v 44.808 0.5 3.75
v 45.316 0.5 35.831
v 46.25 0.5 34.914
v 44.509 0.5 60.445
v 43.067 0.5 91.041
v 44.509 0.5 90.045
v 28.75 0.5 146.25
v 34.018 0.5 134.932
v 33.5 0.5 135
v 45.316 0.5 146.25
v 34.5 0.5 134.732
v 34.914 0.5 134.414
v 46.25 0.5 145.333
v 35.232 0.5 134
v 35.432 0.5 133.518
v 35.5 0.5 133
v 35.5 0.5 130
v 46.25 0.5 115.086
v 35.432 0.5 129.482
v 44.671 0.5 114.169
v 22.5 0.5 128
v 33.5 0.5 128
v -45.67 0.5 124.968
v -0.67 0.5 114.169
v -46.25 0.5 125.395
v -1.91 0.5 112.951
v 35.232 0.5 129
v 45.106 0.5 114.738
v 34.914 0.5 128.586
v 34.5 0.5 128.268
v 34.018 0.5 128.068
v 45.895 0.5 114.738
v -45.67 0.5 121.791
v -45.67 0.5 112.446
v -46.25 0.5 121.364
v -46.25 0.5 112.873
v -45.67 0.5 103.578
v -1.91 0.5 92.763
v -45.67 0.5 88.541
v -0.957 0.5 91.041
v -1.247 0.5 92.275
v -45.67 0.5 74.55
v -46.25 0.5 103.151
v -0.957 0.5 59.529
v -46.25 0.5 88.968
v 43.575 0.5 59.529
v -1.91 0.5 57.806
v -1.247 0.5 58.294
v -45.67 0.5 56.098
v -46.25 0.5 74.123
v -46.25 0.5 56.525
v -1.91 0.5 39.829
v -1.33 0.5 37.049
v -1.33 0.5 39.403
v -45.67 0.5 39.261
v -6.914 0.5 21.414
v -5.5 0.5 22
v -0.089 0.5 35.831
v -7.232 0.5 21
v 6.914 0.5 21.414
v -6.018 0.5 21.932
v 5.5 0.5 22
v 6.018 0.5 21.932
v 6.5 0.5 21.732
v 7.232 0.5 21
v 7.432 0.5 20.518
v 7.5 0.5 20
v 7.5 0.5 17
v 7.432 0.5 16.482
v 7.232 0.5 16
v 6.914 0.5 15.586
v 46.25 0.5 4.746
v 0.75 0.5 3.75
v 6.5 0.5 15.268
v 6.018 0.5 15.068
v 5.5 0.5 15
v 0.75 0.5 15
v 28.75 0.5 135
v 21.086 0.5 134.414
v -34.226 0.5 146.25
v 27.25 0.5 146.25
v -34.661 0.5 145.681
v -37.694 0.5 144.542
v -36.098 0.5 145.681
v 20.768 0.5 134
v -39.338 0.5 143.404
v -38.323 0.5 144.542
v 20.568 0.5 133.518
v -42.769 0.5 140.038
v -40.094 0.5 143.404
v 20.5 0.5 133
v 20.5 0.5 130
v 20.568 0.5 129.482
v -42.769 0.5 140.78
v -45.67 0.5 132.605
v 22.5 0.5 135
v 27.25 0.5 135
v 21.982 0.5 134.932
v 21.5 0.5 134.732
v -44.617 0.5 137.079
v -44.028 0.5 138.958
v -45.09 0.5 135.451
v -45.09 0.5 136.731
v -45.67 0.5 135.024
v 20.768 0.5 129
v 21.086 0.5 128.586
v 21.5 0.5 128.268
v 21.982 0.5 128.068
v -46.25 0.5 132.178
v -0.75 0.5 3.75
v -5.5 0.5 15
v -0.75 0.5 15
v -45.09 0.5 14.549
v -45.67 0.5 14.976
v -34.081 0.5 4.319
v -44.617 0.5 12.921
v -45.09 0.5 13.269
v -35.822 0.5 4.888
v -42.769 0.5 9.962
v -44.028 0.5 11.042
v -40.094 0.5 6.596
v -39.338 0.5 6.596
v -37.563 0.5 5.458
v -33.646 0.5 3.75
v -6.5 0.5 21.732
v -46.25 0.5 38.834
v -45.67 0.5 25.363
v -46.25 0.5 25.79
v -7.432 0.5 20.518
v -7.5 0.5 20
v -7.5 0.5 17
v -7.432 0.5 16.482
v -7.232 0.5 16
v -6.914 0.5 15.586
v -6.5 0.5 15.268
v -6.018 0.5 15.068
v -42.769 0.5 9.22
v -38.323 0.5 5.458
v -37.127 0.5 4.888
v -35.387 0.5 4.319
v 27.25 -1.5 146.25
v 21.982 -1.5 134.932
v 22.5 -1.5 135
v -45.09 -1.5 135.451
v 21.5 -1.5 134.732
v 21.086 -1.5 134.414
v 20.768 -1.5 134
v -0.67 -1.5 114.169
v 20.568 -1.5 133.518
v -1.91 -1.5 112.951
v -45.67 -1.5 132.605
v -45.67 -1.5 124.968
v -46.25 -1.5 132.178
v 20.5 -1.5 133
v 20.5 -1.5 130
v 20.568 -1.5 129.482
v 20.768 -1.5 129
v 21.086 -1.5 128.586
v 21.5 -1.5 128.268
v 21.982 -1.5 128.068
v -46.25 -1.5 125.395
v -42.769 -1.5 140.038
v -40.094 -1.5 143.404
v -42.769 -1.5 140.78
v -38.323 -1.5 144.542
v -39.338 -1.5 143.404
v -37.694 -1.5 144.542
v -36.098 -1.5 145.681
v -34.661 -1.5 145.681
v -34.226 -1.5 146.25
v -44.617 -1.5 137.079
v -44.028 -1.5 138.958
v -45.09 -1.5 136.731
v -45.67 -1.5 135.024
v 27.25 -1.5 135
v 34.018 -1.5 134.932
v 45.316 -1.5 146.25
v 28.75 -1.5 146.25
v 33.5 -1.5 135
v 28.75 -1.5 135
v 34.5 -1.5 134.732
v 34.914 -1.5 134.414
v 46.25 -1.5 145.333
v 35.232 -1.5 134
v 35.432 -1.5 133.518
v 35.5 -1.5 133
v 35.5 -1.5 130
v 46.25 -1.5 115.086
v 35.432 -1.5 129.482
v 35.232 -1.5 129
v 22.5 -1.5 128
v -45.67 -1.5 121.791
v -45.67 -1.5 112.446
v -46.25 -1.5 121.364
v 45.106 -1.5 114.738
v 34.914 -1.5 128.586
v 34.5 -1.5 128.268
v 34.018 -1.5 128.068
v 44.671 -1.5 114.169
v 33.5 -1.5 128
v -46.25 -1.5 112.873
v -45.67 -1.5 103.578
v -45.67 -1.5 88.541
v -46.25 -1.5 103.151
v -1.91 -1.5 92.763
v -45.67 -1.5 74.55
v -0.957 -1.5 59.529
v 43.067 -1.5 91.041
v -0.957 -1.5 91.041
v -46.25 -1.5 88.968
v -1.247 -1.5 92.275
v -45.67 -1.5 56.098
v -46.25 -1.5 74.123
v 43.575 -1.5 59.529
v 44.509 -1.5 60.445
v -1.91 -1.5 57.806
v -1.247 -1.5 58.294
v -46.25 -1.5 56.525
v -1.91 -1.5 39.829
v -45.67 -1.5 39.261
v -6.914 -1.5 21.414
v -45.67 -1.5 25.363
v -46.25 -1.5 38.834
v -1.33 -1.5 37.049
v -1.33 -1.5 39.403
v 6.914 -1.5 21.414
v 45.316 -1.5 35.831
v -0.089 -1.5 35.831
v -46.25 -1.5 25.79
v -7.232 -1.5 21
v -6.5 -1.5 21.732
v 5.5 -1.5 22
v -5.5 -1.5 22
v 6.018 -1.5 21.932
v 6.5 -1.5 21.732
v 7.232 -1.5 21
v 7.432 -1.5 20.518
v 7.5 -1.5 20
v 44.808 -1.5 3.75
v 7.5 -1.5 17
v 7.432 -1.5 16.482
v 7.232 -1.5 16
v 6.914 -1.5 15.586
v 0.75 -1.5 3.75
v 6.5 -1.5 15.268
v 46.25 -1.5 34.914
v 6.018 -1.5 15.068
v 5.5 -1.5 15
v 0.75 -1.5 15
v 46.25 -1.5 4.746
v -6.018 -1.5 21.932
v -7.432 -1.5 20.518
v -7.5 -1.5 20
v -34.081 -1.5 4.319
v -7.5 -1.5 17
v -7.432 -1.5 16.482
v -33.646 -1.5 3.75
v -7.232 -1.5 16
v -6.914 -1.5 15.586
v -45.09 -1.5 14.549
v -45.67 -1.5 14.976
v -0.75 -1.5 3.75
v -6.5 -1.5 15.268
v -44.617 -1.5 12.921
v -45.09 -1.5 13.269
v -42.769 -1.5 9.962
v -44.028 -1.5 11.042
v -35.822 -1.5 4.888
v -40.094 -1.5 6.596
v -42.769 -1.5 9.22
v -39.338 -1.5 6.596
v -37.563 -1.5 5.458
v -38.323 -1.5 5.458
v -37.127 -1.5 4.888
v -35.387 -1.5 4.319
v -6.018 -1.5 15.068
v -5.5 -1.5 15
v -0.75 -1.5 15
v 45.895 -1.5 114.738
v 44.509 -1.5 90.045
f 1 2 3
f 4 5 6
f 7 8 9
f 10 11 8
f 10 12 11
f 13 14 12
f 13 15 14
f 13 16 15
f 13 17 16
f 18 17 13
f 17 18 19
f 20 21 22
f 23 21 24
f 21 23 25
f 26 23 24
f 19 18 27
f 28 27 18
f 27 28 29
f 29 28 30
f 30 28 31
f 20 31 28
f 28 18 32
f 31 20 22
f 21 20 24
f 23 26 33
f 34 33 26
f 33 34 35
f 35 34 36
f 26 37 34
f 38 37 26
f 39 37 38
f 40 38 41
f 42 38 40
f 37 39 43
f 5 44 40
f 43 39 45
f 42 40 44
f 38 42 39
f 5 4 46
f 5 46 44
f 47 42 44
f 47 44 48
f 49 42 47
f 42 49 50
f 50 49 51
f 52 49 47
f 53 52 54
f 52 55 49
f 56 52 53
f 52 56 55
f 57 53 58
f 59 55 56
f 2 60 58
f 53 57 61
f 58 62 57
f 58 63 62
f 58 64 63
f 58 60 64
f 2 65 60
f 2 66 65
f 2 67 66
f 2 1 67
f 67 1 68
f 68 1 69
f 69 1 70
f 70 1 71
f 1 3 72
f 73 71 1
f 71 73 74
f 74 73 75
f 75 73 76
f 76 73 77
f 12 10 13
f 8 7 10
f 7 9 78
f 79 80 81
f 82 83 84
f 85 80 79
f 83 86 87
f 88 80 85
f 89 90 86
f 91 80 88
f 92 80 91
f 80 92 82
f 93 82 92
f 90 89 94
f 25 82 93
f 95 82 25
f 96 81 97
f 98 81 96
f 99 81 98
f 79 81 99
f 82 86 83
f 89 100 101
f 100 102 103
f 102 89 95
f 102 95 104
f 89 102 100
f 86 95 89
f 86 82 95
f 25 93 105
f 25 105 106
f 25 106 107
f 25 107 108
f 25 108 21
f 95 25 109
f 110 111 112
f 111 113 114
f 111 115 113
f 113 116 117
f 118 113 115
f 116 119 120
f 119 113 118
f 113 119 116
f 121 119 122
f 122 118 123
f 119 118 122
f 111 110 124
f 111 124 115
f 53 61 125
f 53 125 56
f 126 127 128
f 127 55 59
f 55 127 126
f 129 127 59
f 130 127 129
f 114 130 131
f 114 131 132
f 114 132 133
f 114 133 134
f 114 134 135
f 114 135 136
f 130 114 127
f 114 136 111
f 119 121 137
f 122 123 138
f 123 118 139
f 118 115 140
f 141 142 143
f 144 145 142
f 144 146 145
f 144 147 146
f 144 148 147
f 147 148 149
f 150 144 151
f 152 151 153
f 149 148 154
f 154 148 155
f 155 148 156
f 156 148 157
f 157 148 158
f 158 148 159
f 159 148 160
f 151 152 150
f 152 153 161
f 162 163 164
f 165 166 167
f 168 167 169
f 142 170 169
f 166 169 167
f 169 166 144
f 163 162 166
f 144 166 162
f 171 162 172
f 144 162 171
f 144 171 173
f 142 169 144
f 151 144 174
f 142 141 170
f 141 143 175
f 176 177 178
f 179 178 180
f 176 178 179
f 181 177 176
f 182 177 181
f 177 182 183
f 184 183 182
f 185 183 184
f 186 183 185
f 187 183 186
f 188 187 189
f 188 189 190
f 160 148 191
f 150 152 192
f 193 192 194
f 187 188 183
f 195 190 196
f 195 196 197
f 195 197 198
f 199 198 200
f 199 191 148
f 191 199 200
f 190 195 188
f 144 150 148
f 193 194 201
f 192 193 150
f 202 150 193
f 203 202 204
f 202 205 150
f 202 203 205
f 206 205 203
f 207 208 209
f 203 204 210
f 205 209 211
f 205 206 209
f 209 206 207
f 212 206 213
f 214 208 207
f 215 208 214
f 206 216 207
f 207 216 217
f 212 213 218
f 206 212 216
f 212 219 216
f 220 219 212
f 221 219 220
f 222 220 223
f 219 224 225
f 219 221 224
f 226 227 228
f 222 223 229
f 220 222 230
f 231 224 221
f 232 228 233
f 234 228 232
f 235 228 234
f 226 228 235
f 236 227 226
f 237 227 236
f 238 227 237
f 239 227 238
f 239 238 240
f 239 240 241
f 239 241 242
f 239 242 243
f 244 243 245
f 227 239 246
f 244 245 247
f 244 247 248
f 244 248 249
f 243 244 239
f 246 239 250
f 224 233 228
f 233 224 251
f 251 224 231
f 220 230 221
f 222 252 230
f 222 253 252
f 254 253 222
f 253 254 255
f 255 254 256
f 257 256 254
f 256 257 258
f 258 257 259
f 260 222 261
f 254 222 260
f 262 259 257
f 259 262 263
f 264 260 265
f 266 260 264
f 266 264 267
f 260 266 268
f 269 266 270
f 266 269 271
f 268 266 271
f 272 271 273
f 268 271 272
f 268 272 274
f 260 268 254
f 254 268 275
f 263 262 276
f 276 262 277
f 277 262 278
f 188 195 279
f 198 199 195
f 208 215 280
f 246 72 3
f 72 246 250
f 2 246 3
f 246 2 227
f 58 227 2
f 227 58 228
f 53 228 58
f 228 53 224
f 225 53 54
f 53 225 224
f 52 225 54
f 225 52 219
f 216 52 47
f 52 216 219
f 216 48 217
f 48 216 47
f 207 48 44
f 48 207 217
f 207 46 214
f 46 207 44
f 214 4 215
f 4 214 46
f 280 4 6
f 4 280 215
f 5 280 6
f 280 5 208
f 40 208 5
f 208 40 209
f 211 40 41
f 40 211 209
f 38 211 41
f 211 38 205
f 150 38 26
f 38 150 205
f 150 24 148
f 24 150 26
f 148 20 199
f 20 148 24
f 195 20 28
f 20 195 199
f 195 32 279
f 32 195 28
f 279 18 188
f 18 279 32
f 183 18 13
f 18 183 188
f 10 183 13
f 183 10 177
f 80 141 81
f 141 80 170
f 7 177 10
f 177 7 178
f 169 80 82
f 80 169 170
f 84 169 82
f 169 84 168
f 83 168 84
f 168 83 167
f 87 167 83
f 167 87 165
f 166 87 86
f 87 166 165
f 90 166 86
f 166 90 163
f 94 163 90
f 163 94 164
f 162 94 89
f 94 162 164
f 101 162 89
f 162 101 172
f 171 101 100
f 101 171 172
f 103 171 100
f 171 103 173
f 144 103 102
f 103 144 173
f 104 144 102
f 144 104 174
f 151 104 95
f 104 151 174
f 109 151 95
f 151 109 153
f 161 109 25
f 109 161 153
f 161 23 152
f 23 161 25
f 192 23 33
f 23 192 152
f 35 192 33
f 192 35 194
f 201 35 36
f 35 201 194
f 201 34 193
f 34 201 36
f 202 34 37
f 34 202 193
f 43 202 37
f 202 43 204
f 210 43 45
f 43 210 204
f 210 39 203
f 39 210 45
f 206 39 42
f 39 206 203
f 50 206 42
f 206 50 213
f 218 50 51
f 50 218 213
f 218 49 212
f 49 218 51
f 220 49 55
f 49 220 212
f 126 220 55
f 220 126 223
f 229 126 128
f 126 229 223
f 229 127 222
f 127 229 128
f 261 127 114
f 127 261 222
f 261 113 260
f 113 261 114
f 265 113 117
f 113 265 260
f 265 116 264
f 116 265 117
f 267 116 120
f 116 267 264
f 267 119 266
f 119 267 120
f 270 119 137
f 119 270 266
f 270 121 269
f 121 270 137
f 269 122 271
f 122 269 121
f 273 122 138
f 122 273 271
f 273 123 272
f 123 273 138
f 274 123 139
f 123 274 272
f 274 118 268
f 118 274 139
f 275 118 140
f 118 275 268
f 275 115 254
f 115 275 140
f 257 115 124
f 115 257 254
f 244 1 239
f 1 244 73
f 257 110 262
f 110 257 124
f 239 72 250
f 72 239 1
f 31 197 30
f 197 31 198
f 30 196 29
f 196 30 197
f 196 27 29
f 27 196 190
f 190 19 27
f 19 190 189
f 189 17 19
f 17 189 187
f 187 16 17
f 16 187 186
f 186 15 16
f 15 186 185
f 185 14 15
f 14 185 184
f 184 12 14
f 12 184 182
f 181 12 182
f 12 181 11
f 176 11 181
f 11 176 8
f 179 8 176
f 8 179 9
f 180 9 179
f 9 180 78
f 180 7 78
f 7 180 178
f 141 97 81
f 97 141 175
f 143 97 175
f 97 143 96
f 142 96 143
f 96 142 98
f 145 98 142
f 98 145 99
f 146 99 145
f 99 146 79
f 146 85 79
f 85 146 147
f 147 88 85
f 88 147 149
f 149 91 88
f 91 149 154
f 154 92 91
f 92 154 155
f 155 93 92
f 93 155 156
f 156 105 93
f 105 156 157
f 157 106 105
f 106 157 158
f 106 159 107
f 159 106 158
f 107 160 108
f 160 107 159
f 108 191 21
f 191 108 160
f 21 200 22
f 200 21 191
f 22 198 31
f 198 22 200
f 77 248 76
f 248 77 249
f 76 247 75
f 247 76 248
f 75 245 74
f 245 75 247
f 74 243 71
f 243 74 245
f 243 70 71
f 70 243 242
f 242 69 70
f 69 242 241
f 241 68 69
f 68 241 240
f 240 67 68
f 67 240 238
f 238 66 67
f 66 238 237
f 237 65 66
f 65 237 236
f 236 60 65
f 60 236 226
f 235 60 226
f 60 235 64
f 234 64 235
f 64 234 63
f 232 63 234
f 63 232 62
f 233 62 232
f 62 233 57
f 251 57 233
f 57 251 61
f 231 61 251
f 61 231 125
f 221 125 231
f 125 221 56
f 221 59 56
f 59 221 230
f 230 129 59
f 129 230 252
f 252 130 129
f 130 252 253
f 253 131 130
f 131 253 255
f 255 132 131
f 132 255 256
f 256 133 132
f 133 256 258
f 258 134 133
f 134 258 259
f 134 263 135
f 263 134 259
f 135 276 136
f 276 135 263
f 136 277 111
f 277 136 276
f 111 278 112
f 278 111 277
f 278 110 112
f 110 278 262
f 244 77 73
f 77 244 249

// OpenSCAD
// file: shape_pts.scad
// Letter "E" (#6 Lower) ? Top X=+28 Conduit (under n right leg) + Bottom X=0 Conduit
// Vertical-display edition: bottom divider clip removed, interlocking hollow double-dovetail channels added.

shape_w = 94.00;
shape_h = 144.00;

rec_snap_top_x = 6.00;
rec_snap_top_z = 144.00;
rec_snap_bot_x = 0.00;

rec_top_conn_enable   = true;
rec_top_conn_x        = 28.00;
rec_bot_conn_enable   = true;
rec_bot_conn_x        = 0.00;
rec_left_conn_enable  = false;
rec_left_conn_z       = 0.00;
rec_left_conn_face_x  = 0.00;
rec_left_conn_pocket_x = 0.00;
rec_right_conn_enable = false;
rec_right_conn_z      = 0.00;
rec_right_conn_face_x = 0.00;
rec_right_conn_pocket_x = 0.00;

rec_magnet_enable = true;
rec_magnet_x      = -24.00;
rec_magnet_z      = 96.20;

rec_wall_mount_enable = true;
rec_wall_mount_x      = 0.00;
rec_wall_mount_z      = 72.30;

rec_include_controller = false;
rec_chip_x     = -24.50;
rec_chip_z     = 82.00;
rec_cable_x    = -24.50;
rec_ziptie_z   = 33.50;
rec_keyhole_z  = 19.50;
rec_slit_dir   = -1;

rec_pillars = [[28.0, 18.0], [25.0, 72.3], [-24.5, 128.0], [-24.5, 38.0]];
rec_has_face_grooves = false;

shape_pts = [
    [0.218,33.581], [-0.58,34.364], [-0.58,36.783], [-1.16,37.209], [-1.16,54.427], [-0.58,54.854],
    [-0.363,55.779], [43.881,55.779], [45.259,57.13], [45.259,87.439], [43.301,88.791], [-0.363,88.791],
    [-0.58,89.715], [-1.16,90.142], [-1.16,109.636], [-0.363,110.419], [45.042,110.419], [45.477,110.988],
    [46.202,110.988], [47.0,111.771], [47.0,142.648], [45.622,144.0], [-34.597,144.0], [-35.032,143.431],
    [-36.338,143.431], [-37.934,142.292], [-38.659,142.292], [-39.674,141.154], [-40.4,141.154], [-43.519,138.095],
    [-43.519,137.383], [-44.679,136.387], [-45.259,134.538], [-45.84,134.111], [-45.84,132.83], [-46.42,132.403],
    [-46.42,129.984], [-47.0,129.557], [-47.0,122.016], [-46.42,121.589], [-46.42,119.17], [-47.0,118.743],
    [-47.0,109.494], [-46.42,109.067], [-46.42,100.957], [-47.0,100.53], [-47.0,85.589], [-46.42,85.162],
    [-46.42,71.929], [-47.0,71.502], [-47.0,53.146], [-46.42,52.719], [-46.42,36.64], [-47.0,36.213],
    [-47.0,22.411], [-46.42,21.984], [-46.42,11.597], [-45.84,11.17], [-45.84,9.889], [-45.259,9.462],
    [-44.679,7.613], [-43.519,6.617], [-43.519,5.905], [-40.4,2.846], [-39.674,2.846], [-38.659,1.708],
    [-37.934,1.708], [-37.498,1.138], [-36.193,1.138], [-35.758,0.569], [-34.452,0.569], [-34.017,0.0],
    [45.042,0.0], [47.0,1.352], [47.0,32.229], [45.622,33.581]
];
shape_paths = [[0, 1, 2, 3, 4, 5, 6, 7, 8, 9, 10, 11, 12, 13, 14, 15, 16, 17, 18, 19, 20, 21, 22, 23, 24, 25, 26, 27, 28, 29, 30, 31, 32, 33, 34, 35, 36, 37, 38, 39, 40, 41, 42, 43, 44, 45, 46, 47, 48, 49, 50, 51, 52, 53, 54, 55, 56, 57, 58, 59, 60, 61, 62, 63, 64, 65, 66, 67, 68, 69, 70, 71, 72, 73, 74, 75]];

diffuser_shape_pts = [
    [0.218,33.581], [-0.58,34.364], [-0.58,36.783], [-1.16,37.209], [-1.16,54.427], [-0.58,54.854],
    [-0.363,55.779], [43.881,55.779], [45.259,57.13], [45.259,87.439], [43.301,88.791], [-0.363,88.791],
    [-0.58,89.715], [-1.16,90.142], [-1.16,109.636], [-0.363,110.419], [45.042,110.419], [45.477,110.988],
    [46.202,110.988], [47.0,111.771], [47.0,142.648], [45.622,144.0], [-23.005,144.0], [-23.429,143.431],
    [-24.137,143.431], [-26.614,140.941], [-26.614,140.229], [-32.489,134.324], [-33.197,134.324], [-34.188,133.186],
    [-36.029,132.617], [-36.453,132.047], [-38.294,131.478], [-38.718,130.909], [-39.992,130.909], [-40.417,130.34],
    [-42.258,130.34], [-42.682,129.771], [-45.089,129.771], [-46.434,128.419], [-46.434,127.708], [-47.0,127.281],
    [-46.42,119.17], [-47.0,118.743], [-47.0,109.494], [-46.42,109.067], [-46.42,100.957], [-47.0,100.53],
    [-47.0,85.589], [-46.42,85.162], [-46.42,71.929], [-47.0,71.502], [-47.0,53.146], [-46.42,52.719],
    [-46.42,36.64], [-47.0,36.213], [-47.0,22.411], [-46.42,21.984], [-46.42,11.597], [-45.84,11.17],
    [-45.84,9.889], [-45.259,9.462], [-44.679,7.613], [-43.519,6.617], [-43.519,5.905], [-40.4,2.846],
    [-39.674,2.846], [-38.659,1.708], [-37.934,1.708], [-37.498,1.138], [-36.193,1.138], [-35.758,0.569],
    [-34.452,0.569], [-34.017,0.0], [45.042,0.0], [47.0,1.352], [47.0,32.229], [45.622,33.581]
];
diffuser_shape_paths = [[0, 1, 2, 3, 4, 5, 6, 7, 8, 9, 10, 11, 12, 13, 14, 15, 16, 17, 18, 19, 20, 21, 22, 23, 24, 25, 26, 27, 28, 29, 30, 31, 32, 33, 34, 35, 36, 37, 38, 39, 40, 41, 42, 43, 44, 45, 46, 47, 48, 49, 50, 51, 52, 53, 54, 55, 56, 57, 58, 59, 60, 61, 62, 63, 64, 65, 66, 67, 68, 69, 70, 71, 72, 73, 74, 75, 76, 77]];

module shape_2d(pts = shape_pts) {
    polygon(points = pts, paths = shape_paths);
}

module diffuser_shape_2d(pts = diffuser_shape_pts) {
    polygon(points = pts, paths = diffuser_shape_paths);
}

module diffuser_face_grooves_2d() {}
// main file
// Letter "E" (#6 Lower) ? Top X=+28 Conduit (under n right leg) + Bottom X=0 Conduit ? internal white reflector plate (2.00 mm thick, aligned LED-strip conduit pockets + entry slits)
// Opens and exports standalone in OpenSCAD / OpenSCAD.js.

use <lamp_core.scad>

render_lamp_part("reflector");
